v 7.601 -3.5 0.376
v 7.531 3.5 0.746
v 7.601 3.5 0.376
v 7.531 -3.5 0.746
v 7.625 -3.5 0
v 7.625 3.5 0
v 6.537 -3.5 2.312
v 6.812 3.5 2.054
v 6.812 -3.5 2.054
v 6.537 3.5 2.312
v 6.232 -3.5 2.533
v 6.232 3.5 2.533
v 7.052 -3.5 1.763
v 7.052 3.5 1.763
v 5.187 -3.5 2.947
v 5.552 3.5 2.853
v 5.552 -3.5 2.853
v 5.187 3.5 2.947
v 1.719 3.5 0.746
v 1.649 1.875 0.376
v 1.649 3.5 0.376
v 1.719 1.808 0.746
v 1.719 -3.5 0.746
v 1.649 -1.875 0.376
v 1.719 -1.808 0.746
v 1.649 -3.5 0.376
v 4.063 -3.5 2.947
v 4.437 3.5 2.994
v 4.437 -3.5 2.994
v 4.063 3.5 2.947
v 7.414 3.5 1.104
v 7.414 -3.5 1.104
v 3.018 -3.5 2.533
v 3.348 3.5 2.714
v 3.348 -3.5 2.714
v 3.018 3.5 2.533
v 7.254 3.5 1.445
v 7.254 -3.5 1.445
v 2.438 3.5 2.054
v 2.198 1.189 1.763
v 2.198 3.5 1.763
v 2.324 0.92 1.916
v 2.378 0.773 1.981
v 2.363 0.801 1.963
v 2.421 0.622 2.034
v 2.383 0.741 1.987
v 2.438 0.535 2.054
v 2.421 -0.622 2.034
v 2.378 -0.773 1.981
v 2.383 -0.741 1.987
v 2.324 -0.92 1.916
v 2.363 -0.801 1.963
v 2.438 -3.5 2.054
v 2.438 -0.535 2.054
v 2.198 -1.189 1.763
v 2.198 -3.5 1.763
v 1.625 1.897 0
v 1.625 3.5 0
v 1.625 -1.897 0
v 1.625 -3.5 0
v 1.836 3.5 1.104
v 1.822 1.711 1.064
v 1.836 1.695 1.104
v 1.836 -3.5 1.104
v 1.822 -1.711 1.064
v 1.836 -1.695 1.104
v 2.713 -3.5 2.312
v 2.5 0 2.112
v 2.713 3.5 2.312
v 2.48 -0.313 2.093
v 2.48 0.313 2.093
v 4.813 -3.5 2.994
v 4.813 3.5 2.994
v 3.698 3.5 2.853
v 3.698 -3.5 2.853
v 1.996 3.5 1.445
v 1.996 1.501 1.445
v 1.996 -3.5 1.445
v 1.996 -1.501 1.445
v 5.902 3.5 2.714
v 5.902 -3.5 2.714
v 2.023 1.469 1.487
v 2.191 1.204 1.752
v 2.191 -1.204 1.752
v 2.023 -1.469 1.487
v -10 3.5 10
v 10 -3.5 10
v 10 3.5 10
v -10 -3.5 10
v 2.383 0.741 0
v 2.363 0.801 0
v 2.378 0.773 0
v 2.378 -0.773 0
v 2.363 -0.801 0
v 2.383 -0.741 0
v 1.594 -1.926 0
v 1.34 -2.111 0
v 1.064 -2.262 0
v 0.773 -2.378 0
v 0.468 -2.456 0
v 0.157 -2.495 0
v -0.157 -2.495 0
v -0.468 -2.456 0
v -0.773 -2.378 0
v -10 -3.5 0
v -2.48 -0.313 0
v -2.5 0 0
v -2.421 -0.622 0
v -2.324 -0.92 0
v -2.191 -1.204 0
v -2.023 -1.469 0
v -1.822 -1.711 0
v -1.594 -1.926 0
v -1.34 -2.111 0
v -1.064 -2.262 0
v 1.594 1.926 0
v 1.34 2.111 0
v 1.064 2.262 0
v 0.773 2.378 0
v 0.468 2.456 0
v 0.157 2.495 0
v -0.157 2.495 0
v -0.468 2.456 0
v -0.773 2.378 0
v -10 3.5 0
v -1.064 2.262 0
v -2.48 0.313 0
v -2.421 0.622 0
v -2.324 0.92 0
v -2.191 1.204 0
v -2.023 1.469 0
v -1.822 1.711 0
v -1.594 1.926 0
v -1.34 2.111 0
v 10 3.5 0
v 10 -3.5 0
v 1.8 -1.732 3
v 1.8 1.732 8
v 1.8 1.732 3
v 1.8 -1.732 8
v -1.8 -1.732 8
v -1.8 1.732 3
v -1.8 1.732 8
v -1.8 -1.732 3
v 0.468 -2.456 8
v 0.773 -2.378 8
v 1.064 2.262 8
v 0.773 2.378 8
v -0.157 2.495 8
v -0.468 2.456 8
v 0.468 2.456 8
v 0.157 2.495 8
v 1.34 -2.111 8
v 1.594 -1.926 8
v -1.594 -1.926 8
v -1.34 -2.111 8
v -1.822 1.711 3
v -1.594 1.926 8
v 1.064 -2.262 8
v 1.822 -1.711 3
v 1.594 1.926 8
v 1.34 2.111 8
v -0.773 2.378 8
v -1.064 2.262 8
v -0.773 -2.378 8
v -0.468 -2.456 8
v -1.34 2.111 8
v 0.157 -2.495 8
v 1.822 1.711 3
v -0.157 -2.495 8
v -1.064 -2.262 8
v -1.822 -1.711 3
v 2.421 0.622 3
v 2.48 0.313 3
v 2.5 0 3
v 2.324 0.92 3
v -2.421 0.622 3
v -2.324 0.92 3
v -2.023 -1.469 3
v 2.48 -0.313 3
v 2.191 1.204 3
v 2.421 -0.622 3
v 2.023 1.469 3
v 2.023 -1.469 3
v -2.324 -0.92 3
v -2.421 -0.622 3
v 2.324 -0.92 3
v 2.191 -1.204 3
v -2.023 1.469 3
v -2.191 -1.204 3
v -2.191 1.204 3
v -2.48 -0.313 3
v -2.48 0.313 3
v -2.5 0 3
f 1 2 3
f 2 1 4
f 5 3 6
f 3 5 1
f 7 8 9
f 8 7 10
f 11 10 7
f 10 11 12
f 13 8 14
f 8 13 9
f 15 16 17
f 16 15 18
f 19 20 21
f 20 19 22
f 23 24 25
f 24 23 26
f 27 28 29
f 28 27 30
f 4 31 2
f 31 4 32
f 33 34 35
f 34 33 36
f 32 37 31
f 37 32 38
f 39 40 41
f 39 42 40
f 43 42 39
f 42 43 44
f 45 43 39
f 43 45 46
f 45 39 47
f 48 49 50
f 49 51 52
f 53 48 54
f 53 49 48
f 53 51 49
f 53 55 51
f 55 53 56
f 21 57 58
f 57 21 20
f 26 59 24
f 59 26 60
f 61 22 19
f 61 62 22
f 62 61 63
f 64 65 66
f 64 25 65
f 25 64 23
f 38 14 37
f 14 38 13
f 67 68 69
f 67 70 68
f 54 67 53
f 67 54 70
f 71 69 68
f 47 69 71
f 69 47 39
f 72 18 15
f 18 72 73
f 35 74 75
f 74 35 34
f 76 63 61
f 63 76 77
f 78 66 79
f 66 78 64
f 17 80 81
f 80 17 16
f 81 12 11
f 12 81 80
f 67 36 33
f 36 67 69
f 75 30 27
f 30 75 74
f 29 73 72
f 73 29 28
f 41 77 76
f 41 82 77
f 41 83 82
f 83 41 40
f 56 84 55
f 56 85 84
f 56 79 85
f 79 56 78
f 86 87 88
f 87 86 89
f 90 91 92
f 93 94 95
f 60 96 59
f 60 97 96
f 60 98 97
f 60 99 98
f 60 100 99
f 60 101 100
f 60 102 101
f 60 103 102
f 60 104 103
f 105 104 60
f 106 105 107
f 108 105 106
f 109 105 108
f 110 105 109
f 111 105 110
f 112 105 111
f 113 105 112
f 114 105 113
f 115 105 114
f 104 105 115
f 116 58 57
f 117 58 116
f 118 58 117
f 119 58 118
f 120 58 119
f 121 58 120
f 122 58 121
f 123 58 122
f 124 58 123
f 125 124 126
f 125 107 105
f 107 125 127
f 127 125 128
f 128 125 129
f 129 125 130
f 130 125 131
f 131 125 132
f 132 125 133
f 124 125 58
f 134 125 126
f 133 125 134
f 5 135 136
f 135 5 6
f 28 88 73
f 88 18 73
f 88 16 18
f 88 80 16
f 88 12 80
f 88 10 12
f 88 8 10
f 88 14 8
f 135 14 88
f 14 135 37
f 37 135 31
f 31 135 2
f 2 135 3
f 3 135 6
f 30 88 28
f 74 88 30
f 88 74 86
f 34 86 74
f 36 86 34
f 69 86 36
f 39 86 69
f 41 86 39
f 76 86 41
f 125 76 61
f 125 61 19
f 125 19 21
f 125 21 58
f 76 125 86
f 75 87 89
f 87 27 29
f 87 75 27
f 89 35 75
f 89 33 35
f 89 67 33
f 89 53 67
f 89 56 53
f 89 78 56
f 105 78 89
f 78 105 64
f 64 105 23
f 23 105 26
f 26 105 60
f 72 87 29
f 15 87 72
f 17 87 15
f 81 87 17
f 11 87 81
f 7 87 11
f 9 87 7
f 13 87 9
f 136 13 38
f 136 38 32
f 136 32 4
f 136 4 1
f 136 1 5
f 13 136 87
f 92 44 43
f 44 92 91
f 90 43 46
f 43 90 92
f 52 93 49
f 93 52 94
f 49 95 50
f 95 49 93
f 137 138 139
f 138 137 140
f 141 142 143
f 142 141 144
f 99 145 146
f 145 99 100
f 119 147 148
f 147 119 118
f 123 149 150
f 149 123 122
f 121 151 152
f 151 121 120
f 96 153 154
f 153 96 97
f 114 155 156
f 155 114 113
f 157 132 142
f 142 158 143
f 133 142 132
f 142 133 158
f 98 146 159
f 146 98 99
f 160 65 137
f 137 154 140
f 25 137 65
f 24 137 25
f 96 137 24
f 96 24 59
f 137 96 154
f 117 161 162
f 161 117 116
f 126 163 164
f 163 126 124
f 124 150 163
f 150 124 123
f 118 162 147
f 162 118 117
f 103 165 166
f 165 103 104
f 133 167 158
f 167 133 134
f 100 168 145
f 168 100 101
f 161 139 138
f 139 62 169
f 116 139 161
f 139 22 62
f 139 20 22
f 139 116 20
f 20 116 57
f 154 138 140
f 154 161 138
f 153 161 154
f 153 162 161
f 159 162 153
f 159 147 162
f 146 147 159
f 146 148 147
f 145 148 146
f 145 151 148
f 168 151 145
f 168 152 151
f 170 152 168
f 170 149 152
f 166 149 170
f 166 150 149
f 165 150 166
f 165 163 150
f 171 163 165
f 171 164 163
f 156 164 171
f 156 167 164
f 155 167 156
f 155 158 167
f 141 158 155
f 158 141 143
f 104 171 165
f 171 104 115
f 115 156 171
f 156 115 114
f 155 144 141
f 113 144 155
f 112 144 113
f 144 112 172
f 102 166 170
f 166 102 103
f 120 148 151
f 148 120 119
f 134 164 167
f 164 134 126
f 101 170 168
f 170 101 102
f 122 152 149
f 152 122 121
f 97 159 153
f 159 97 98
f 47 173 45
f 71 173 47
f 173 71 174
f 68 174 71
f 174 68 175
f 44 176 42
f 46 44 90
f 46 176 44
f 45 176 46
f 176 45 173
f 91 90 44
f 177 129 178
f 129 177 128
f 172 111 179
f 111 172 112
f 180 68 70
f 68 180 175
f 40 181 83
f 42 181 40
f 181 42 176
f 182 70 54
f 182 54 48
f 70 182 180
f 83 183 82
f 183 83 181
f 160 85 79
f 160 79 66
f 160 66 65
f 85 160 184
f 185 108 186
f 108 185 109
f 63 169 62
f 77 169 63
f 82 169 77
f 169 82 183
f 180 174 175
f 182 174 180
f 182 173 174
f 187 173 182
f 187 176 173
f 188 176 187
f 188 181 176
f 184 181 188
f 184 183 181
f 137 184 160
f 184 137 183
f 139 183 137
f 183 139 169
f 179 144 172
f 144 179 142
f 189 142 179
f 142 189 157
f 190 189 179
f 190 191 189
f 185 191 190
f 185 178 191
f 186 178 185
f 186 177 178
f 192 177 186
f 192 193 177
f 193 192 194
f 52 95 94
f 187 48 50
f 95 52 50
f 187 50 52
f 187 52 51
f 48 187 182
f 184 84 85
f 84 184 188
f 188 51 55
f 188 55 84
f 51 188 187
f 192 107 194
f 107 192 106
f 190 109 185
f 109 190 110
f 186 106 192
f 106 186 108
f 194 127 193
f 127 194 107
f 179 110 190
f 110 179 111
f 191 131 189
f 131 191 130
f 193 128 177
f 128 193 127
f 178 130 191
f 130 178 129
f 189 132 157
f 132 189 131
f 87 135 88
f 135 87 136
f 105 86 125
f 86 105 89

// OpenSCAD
//Main plate geometry
main_base_thickness = 5;
main_base_r = 90;

//Main ring geometry
main_ring_outer_r = 100;
main_ring_inner_r = 95;
main_ring_h = 60;
ring_clearance = 5;

//Motor hole properties
axel_to_screw_centerline_dist = 8;
screwhole_to_screwhole_dist = 35;
axel_plug_r = 4.75;
axel_base_r = 5/2;
axel_tip_w = 3;


//Arm geometry
arm_length = 2*main_ring_inner_r - ring_clearance;
arm_width = 7;
groove_r = 3;
n_grooves = 10;

//Axel geometry
axel_r = 5/2;
axel_w = 3.6;
axel_h = 8;
axel_small_h = 3;

//Connector geometry
connector_r = axel_r;
connector_h = 10;

intersection(){

    difference(){
        union(){
            //Grooved arm
            difference(){
                //Main arm
                translate([-arm_length/2, -arm_width/2, 0]){
                    
                    cube([arm_length, arm_width, 10]);
                }    

                //Grooves
                translate([arm_length/(4*n_grooves), arm_width, 0]){
                    for (i = [0:n_grooves]){
                        translate([i*arm_length/(2*n_grooves), 0, 0,]){
                            rotate([90, 0, 0]) cylinder(h=2*arm_width, r=groove_r, $fn=50);  
                        }
                    }
                }
                  
            }
            
            //Connector
            cylinder(h=connector_h, r=connector_r, $fn=20);


        }
        
        //Connector hole
        cylinder(h=axel_small_h, r=axel_r, $fn=50);
        
        
        intersection(){
            cube([axel_w, 20,20],center=true);
            cylinder(h=axel_h, r=axel_r, $fn=50);
        }
        
    }


cube([20, 20, 50], center=true);

}
